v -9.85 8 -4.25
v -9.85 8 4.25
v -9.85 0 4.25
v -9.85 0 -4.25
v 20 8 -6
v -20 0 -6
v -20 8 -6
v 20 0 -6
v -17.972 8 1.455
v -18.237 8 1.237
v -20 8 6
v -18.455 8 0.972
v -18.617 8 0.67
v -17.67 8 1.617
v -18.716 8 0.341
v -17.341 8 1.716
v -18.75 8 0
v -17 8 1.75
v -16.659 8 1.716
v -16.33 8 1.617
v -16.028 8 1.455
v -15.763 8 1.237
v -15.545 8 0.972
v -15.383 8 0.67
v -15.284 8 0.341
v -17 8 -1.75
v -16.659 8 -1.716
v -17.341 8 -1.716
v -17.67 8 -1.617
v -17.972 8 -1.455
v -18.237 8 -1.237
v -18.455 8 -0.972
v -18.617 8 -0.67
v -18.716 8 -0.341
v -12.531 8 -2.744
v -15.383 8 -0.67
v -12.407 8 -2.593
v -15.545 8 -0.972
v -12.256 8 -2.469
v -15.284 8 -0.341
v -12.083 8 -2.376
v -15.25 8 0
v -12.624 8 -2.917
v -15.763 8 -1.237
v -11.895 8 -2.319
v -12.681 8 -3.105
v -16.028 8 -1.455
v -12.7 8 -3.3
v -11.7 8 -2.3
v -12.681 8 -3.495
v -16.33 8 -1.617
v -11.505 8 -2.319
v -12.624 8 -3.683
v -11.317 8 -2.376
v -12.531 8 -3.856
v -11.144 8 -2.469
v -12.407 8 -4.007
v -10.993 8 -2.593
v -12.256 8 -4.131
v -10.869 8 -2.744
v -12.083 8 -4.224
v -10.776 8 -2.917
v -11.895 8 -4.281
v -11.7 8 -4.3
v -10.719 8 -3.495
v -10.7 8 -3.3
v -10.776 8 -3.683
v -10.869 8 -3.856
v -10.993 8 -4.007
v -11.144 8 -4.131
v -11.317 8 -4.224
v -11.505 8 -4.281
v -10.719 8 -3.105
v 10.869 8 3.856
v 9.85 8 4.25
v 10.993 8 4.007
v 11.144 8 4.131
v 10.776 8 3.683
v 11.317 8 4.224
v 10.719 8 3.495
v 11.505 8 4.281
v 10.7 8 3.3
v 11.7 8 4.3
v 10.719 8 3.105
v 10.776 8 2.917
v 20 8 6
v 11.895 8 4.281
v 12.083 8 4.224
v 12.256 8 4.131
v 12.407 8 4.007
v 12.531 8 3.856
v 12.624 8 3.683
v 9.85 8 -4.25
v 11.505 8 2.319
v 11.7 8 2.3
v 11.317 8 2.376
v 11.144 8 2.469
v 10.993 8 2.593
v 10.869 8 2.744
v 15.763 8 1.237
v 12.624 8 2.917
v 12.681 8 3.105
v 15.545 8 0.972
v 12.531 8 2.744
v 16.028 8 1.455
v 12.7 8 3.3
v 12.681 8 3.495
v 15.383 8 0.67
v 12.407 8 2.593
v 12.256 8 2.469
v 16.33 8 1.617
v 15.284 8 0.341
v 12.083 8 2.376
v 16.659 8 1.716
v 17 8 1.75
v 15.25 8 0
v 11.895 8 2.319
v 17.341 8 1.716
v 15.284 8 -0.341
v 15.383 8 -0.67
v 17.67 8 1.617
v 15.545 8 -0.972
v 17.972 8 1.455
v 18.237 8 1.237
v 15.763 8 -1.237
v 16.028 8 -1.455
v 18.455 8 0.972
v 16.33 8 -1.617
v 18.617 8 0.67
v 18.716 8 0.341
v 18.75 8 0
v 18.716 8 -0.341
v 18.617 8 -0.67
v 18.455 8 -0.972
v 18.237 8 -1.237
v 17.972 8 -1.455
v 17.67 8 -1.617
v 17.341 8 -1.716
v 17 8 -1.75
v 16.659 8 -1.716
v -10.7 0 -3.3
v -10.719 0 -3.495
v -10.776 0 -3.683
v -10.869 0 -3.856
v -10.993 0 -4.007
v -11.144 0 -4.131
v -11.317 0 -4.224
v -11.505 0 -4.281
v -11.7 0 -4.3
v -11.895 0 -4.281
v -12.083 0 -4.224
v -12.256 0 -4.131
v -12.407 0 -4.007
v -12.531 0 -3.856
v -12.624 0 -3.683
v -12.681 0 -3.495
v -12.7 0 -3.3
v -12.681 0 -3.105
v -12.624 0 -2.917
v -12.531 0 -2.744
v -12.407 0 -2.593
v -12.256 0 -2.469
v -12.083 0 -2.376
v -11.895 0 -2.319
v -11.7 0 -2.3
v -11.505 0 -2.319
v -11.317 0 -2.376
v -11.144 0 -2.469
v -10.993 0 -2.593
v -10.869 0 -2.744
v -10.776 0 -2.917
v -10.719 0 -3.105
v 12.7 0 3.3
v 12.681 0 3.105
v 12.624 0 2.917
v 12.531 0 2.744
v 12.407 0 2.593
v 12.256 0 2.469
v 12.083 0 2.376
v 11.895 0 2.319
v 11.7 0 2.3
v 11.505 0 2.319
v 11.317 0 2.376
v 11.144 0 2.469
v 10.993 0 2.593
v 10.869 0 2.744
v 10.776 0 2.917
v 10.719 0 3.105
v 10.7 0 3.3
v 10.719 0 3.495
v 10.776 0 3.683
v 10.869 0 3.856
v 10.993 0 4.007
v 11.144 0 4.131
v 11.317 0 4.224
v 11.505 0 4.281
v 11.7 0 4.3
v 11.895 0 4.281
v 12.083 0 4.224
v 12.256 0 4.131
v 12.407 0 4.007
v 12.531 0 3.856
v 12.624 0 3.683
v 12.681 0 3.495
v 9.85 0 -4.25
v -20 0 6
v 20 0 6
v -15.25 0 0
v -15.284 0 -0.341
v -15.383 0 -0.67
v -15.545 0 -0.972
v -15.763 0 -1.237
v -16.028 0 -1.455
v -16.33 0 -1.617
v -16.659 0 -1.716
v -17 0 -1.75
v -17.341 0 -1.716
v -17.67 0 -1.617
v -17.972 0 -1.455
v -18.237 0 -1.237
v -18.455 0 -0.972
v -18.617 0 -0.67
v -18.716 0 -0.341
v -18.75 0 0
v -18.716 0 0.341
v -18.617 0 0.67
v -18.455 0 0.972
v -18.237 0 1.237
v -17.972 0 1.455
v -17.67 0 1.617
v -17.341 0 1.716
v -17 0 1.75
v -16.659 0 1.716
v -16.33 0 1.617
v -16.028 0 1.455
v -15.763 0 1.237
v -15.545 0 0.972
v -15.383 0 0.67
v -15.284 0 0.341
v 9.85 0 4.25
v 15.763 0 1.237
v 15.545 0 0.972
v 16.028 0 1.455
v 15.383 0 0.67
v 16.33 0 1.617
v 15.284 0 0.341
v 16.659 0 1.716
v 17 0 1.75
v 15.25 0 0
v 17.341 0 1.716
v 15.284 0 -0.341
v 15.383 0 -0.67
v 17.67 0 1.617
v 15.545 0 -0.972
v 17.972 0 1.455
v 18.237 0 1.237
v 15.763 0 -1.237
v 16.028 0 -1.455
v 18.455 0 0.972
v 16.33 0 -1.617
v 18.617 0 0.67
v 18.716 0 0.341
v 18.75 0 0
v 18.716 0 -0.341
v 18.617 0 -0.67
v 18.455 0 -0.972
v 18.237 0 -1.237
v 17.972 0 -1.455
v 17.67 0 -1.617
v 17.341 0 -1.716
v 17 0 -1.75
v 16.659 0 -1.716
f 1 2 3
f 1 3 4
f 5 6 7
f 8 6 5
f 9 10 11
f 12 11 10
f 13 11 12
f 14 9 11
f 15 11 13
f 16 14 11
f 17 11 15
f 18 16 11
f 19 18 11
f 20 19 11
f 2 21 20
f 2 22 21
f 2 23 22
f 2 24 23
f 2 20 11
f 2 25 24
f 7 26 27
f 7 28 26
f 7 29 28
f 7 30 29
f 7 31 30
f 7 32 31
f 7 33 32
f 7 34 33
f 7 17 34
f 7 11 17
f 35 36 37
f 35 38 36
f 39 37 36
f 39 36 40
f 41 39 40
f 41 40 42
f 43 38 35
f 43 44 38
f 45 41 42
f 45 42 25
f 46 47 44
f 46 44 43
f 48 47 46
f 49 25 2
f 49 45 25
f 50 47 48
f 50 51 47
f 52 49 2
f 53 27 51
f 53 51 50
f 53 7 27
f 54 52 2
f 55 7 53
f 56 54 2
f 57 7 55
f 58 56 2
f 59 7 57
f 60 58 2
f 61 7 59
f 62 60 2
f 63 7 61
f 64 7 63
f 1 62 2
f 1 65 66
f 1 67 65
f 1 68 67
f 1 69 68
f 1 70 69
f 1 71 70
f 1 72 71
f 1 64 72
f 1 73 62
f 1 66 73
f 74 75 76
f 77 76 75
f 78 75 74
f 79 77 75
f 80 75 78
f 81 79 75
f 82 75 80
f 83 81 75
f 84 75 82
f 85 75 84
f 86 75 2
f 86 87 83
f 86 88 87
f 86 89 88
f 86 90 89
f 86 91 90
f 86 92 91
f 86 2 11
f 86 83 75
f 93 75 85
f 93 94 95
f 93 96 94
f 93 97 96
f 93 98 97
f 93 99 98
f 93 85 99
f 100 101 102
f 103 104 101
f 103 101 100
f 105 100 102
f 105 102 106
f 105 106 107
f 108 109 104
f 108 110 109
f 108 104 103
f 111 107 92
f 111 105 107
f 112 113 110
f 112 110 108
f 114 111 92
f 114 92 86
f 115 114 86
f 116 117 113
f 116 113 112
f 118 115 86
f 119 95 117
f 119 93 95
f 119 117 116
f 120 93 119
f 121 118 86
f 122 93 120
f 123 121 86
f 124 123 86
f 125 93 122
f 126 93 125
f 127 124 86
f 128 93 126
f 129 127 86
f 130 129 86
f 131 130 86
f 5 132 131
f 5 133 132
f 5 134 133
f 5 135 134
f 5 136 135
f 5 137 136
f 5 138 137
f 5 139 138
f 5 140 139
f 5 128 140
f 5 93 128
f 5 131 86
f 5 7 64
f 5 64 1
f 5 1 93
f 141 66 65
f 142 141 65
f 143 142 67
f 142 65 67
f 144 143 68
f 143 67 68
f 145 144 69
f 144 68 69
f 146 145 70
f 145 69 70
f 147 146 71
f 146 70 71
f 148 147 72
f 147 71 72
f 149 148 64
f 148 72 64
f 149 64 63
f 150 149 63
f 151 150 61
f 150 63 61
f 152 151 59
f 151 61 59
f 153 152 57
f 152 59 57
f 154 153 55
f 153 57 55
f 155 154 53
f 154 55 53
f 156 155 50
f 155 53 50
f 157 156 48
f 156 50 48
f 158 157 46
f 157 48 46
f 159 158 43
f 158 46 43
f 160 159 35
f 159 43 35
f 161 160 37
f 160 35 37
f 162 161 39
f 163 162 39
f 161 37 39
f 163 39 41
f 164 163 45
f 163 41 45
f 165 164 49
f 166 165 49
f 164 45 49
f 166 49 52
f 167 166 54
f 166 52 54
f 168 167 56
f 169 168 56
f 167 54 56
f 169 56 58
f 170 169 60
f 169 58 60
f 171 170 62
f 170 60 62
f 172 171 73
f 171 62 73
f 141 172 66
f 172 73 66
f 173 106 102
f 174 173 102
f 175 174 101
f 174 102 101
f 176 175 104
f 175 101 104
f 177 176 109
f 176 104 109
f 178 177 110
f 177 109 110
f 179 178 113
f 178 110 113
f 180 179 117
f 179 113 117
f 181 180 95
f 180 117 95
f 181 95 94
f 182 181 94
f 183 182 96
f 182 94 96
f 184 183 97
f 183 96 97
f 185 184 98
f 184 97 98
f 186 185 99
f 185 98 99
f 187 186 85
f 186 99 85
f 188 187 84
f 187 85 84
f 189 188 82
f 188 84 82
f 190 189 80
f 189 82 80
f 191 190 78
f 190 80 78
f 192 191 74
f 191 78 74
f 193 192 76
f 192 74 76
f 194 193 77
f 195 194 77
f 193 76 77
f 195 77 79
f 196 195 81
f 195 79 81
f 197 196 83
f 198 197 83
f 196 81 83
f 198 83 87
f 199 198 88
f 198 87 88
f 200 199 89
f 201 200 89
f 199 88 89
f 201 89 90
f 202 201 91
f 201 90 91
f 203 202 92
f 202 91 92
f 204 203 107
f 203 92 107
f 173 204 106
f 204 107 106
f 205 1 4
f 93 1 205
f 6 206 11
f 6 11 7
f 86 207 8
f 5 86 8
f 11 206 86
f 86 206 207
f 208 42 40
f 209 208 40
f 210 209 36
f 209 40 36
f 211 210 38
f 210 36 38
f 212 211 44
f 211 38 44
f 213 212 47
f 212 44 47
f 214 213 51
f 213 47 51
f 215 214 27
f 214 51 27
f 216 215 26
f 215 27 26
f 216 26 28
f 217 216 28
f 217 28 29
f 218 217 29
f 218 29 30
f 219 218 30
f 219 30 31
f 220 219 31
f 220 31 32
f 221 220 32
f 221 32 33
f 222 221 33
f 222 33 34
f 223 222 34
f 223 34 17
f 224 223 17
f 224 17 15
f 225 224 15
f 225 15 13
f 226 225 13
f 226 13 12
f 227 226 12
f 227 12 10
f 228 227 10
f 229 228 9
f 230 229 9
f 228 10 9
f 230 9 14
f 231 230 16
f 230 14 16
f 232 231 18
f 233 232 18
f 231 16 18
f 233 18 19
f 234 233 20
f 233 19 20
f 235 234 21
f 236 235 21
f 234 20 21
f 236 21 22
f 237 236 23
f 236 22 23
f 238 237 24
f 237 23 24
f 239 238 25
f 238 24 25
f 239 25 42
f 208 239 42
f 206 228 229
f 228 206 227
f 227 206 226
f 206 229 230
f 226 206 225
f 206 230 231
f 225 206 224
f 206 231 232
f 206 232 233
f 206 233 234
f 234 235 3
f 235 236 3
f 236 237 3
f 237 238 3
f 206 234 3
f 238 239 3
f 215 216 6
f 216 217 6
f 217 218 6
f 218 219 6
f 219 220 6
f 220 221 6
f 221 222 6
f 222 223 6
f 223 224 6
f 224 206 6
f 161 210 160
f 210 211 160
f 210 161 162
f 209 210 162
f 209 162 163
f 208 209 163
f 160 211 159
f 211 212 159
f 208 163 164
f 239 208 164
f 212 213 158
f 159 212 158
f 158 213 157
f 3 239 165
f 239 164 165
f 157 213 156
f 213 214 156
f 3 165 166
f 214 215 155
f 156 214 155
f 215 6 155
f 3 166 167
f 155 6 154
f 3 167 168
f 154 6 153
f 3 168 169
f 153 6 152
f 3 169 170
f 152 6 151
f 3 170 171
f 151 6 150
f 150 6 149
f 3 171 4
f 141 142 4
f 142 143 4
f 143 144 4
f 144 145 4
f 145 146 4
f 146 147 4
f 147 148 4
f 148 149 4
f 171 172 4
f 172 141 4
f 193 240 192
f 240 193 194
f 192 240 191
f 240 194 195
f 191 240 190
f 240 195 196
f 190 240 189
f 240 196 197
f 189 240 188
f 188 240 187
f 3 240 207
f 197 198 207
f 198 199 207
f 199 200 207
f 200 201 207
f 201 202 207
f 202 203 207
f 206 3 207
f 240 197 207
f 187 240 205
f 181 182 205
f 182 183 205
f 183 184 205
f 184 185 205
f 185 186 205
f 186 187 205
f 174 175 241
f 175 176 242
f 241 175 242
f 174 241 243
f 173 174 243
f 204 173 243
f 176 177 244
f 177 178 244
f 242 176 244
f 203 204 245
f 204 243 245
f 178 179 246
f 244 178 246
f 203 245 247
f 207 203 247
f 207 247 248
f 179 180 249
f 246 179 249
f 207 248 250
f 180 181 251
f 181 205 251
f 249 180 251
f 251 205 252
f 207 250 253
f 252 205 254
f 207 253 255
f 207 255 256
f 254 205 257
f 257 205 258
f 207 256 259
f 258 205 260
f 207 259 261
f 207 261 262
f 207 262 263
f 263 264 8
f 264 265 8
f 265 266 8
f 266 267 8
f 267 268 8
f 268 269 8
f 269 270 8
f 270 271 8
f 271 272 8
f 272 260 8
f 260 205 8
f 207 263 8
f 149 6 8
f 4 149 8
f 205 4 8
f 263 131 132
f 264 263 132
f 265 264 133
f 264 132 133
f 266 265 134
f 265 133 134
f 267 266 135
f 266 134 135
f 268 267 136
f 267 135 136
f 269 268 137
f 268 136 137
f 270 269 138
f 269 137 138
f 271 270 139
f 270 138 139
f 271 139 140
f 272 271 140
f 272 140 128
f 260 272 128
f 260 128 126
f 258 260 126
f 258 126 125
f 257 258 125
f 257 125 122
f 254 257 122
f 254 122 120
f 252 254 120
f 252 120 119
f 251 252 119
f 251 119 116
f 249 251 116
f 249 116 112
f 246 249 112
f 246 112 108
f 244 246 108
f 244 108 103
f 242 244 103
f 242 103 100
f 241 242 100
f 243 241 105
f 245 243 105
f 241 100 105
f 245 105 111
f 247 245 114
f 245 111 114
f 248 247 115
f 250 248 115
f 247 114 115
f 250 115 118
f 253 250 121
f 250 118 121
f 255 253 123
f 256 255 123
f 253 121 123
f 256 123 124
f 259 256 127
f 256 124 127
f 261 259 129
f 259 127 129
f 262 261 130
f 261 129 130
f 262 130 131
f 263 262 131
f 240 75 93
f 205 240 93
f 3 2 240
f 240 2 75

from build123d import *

# Parameters (mm, degrees)
SKETCH_1_W          = 40
SKETCH_1_H          = 12
EXTRUDE_1_DEPTH     = 8
SKETCH_2_W          = 19.7
SKETCH_2_H          = 8.5
CUT_EXTRUDE_1_DEPTH = 8
SKETCH_3_R          = 1
CUT_EXTRUDE_2_DEPTH = 8
SKETCH_4_R          = 1.75
CUT_EXTRUDE_3_DEPTH = 10


with BuildPart() as part:
    # 스케치1 → 보스-돌출1 (new body)
    with BuildSketch(Plane(origin=(0, 0, 0), x_dir=(1, 0, 0), z_dir=(0, 1, 0))):
        Rectangle(SKETCH_1_W, SKETCH_1_H)
    extrude(amount=EXTRUDE_1_DEPTH)

    # 스케치2 → 컷-돌출1 (cut)
    with BuildSketch(Plane(origin=(0, 8, 0), x_dir=(1, 0, 0), z_dir=(0, 1, 0))):
        Rectangle(SKETCH_2_W, SKETCH_2_H)
    extrude(amount=-CUT_EXTRUDE_1_DEPTH, mode=Mode.SUBTRACT)

    # 스케치3 → 컷-돌출2 (cut)
    with BuildSketch(Plane(origin=(0, 8, 0), x_dir=(1, 0, 0), z_dir=(0, 1, 0))):
        with Locations((-11.7, 3.3)):
            Circle(SKETCH_3_R)
        with Locations((11.7, -3.3)):
            Circle(SKETCH_3_R)
    extrude(amount=-CUT_EXTRUDE_2_DEPTH, mode=Mode.SUBTRACT)

    # 스케치4 → 컷-돌출3 (cut)
    with BuildSketch(Plane(origin=(0, 8, 0), x_dir=(1, 0, 0), z_dir=(0, 1, 0))):
        with Locations((-17, 0)):
            Circle(SKETCH_4_R)
        with Locations((17, 0)):
            Circle(SKETCH_4_R)
    extrude(amount=-CUT_EXTRUDE_3_DEPTH, mode=Mode.SUBTRACT)


solid = part.part
